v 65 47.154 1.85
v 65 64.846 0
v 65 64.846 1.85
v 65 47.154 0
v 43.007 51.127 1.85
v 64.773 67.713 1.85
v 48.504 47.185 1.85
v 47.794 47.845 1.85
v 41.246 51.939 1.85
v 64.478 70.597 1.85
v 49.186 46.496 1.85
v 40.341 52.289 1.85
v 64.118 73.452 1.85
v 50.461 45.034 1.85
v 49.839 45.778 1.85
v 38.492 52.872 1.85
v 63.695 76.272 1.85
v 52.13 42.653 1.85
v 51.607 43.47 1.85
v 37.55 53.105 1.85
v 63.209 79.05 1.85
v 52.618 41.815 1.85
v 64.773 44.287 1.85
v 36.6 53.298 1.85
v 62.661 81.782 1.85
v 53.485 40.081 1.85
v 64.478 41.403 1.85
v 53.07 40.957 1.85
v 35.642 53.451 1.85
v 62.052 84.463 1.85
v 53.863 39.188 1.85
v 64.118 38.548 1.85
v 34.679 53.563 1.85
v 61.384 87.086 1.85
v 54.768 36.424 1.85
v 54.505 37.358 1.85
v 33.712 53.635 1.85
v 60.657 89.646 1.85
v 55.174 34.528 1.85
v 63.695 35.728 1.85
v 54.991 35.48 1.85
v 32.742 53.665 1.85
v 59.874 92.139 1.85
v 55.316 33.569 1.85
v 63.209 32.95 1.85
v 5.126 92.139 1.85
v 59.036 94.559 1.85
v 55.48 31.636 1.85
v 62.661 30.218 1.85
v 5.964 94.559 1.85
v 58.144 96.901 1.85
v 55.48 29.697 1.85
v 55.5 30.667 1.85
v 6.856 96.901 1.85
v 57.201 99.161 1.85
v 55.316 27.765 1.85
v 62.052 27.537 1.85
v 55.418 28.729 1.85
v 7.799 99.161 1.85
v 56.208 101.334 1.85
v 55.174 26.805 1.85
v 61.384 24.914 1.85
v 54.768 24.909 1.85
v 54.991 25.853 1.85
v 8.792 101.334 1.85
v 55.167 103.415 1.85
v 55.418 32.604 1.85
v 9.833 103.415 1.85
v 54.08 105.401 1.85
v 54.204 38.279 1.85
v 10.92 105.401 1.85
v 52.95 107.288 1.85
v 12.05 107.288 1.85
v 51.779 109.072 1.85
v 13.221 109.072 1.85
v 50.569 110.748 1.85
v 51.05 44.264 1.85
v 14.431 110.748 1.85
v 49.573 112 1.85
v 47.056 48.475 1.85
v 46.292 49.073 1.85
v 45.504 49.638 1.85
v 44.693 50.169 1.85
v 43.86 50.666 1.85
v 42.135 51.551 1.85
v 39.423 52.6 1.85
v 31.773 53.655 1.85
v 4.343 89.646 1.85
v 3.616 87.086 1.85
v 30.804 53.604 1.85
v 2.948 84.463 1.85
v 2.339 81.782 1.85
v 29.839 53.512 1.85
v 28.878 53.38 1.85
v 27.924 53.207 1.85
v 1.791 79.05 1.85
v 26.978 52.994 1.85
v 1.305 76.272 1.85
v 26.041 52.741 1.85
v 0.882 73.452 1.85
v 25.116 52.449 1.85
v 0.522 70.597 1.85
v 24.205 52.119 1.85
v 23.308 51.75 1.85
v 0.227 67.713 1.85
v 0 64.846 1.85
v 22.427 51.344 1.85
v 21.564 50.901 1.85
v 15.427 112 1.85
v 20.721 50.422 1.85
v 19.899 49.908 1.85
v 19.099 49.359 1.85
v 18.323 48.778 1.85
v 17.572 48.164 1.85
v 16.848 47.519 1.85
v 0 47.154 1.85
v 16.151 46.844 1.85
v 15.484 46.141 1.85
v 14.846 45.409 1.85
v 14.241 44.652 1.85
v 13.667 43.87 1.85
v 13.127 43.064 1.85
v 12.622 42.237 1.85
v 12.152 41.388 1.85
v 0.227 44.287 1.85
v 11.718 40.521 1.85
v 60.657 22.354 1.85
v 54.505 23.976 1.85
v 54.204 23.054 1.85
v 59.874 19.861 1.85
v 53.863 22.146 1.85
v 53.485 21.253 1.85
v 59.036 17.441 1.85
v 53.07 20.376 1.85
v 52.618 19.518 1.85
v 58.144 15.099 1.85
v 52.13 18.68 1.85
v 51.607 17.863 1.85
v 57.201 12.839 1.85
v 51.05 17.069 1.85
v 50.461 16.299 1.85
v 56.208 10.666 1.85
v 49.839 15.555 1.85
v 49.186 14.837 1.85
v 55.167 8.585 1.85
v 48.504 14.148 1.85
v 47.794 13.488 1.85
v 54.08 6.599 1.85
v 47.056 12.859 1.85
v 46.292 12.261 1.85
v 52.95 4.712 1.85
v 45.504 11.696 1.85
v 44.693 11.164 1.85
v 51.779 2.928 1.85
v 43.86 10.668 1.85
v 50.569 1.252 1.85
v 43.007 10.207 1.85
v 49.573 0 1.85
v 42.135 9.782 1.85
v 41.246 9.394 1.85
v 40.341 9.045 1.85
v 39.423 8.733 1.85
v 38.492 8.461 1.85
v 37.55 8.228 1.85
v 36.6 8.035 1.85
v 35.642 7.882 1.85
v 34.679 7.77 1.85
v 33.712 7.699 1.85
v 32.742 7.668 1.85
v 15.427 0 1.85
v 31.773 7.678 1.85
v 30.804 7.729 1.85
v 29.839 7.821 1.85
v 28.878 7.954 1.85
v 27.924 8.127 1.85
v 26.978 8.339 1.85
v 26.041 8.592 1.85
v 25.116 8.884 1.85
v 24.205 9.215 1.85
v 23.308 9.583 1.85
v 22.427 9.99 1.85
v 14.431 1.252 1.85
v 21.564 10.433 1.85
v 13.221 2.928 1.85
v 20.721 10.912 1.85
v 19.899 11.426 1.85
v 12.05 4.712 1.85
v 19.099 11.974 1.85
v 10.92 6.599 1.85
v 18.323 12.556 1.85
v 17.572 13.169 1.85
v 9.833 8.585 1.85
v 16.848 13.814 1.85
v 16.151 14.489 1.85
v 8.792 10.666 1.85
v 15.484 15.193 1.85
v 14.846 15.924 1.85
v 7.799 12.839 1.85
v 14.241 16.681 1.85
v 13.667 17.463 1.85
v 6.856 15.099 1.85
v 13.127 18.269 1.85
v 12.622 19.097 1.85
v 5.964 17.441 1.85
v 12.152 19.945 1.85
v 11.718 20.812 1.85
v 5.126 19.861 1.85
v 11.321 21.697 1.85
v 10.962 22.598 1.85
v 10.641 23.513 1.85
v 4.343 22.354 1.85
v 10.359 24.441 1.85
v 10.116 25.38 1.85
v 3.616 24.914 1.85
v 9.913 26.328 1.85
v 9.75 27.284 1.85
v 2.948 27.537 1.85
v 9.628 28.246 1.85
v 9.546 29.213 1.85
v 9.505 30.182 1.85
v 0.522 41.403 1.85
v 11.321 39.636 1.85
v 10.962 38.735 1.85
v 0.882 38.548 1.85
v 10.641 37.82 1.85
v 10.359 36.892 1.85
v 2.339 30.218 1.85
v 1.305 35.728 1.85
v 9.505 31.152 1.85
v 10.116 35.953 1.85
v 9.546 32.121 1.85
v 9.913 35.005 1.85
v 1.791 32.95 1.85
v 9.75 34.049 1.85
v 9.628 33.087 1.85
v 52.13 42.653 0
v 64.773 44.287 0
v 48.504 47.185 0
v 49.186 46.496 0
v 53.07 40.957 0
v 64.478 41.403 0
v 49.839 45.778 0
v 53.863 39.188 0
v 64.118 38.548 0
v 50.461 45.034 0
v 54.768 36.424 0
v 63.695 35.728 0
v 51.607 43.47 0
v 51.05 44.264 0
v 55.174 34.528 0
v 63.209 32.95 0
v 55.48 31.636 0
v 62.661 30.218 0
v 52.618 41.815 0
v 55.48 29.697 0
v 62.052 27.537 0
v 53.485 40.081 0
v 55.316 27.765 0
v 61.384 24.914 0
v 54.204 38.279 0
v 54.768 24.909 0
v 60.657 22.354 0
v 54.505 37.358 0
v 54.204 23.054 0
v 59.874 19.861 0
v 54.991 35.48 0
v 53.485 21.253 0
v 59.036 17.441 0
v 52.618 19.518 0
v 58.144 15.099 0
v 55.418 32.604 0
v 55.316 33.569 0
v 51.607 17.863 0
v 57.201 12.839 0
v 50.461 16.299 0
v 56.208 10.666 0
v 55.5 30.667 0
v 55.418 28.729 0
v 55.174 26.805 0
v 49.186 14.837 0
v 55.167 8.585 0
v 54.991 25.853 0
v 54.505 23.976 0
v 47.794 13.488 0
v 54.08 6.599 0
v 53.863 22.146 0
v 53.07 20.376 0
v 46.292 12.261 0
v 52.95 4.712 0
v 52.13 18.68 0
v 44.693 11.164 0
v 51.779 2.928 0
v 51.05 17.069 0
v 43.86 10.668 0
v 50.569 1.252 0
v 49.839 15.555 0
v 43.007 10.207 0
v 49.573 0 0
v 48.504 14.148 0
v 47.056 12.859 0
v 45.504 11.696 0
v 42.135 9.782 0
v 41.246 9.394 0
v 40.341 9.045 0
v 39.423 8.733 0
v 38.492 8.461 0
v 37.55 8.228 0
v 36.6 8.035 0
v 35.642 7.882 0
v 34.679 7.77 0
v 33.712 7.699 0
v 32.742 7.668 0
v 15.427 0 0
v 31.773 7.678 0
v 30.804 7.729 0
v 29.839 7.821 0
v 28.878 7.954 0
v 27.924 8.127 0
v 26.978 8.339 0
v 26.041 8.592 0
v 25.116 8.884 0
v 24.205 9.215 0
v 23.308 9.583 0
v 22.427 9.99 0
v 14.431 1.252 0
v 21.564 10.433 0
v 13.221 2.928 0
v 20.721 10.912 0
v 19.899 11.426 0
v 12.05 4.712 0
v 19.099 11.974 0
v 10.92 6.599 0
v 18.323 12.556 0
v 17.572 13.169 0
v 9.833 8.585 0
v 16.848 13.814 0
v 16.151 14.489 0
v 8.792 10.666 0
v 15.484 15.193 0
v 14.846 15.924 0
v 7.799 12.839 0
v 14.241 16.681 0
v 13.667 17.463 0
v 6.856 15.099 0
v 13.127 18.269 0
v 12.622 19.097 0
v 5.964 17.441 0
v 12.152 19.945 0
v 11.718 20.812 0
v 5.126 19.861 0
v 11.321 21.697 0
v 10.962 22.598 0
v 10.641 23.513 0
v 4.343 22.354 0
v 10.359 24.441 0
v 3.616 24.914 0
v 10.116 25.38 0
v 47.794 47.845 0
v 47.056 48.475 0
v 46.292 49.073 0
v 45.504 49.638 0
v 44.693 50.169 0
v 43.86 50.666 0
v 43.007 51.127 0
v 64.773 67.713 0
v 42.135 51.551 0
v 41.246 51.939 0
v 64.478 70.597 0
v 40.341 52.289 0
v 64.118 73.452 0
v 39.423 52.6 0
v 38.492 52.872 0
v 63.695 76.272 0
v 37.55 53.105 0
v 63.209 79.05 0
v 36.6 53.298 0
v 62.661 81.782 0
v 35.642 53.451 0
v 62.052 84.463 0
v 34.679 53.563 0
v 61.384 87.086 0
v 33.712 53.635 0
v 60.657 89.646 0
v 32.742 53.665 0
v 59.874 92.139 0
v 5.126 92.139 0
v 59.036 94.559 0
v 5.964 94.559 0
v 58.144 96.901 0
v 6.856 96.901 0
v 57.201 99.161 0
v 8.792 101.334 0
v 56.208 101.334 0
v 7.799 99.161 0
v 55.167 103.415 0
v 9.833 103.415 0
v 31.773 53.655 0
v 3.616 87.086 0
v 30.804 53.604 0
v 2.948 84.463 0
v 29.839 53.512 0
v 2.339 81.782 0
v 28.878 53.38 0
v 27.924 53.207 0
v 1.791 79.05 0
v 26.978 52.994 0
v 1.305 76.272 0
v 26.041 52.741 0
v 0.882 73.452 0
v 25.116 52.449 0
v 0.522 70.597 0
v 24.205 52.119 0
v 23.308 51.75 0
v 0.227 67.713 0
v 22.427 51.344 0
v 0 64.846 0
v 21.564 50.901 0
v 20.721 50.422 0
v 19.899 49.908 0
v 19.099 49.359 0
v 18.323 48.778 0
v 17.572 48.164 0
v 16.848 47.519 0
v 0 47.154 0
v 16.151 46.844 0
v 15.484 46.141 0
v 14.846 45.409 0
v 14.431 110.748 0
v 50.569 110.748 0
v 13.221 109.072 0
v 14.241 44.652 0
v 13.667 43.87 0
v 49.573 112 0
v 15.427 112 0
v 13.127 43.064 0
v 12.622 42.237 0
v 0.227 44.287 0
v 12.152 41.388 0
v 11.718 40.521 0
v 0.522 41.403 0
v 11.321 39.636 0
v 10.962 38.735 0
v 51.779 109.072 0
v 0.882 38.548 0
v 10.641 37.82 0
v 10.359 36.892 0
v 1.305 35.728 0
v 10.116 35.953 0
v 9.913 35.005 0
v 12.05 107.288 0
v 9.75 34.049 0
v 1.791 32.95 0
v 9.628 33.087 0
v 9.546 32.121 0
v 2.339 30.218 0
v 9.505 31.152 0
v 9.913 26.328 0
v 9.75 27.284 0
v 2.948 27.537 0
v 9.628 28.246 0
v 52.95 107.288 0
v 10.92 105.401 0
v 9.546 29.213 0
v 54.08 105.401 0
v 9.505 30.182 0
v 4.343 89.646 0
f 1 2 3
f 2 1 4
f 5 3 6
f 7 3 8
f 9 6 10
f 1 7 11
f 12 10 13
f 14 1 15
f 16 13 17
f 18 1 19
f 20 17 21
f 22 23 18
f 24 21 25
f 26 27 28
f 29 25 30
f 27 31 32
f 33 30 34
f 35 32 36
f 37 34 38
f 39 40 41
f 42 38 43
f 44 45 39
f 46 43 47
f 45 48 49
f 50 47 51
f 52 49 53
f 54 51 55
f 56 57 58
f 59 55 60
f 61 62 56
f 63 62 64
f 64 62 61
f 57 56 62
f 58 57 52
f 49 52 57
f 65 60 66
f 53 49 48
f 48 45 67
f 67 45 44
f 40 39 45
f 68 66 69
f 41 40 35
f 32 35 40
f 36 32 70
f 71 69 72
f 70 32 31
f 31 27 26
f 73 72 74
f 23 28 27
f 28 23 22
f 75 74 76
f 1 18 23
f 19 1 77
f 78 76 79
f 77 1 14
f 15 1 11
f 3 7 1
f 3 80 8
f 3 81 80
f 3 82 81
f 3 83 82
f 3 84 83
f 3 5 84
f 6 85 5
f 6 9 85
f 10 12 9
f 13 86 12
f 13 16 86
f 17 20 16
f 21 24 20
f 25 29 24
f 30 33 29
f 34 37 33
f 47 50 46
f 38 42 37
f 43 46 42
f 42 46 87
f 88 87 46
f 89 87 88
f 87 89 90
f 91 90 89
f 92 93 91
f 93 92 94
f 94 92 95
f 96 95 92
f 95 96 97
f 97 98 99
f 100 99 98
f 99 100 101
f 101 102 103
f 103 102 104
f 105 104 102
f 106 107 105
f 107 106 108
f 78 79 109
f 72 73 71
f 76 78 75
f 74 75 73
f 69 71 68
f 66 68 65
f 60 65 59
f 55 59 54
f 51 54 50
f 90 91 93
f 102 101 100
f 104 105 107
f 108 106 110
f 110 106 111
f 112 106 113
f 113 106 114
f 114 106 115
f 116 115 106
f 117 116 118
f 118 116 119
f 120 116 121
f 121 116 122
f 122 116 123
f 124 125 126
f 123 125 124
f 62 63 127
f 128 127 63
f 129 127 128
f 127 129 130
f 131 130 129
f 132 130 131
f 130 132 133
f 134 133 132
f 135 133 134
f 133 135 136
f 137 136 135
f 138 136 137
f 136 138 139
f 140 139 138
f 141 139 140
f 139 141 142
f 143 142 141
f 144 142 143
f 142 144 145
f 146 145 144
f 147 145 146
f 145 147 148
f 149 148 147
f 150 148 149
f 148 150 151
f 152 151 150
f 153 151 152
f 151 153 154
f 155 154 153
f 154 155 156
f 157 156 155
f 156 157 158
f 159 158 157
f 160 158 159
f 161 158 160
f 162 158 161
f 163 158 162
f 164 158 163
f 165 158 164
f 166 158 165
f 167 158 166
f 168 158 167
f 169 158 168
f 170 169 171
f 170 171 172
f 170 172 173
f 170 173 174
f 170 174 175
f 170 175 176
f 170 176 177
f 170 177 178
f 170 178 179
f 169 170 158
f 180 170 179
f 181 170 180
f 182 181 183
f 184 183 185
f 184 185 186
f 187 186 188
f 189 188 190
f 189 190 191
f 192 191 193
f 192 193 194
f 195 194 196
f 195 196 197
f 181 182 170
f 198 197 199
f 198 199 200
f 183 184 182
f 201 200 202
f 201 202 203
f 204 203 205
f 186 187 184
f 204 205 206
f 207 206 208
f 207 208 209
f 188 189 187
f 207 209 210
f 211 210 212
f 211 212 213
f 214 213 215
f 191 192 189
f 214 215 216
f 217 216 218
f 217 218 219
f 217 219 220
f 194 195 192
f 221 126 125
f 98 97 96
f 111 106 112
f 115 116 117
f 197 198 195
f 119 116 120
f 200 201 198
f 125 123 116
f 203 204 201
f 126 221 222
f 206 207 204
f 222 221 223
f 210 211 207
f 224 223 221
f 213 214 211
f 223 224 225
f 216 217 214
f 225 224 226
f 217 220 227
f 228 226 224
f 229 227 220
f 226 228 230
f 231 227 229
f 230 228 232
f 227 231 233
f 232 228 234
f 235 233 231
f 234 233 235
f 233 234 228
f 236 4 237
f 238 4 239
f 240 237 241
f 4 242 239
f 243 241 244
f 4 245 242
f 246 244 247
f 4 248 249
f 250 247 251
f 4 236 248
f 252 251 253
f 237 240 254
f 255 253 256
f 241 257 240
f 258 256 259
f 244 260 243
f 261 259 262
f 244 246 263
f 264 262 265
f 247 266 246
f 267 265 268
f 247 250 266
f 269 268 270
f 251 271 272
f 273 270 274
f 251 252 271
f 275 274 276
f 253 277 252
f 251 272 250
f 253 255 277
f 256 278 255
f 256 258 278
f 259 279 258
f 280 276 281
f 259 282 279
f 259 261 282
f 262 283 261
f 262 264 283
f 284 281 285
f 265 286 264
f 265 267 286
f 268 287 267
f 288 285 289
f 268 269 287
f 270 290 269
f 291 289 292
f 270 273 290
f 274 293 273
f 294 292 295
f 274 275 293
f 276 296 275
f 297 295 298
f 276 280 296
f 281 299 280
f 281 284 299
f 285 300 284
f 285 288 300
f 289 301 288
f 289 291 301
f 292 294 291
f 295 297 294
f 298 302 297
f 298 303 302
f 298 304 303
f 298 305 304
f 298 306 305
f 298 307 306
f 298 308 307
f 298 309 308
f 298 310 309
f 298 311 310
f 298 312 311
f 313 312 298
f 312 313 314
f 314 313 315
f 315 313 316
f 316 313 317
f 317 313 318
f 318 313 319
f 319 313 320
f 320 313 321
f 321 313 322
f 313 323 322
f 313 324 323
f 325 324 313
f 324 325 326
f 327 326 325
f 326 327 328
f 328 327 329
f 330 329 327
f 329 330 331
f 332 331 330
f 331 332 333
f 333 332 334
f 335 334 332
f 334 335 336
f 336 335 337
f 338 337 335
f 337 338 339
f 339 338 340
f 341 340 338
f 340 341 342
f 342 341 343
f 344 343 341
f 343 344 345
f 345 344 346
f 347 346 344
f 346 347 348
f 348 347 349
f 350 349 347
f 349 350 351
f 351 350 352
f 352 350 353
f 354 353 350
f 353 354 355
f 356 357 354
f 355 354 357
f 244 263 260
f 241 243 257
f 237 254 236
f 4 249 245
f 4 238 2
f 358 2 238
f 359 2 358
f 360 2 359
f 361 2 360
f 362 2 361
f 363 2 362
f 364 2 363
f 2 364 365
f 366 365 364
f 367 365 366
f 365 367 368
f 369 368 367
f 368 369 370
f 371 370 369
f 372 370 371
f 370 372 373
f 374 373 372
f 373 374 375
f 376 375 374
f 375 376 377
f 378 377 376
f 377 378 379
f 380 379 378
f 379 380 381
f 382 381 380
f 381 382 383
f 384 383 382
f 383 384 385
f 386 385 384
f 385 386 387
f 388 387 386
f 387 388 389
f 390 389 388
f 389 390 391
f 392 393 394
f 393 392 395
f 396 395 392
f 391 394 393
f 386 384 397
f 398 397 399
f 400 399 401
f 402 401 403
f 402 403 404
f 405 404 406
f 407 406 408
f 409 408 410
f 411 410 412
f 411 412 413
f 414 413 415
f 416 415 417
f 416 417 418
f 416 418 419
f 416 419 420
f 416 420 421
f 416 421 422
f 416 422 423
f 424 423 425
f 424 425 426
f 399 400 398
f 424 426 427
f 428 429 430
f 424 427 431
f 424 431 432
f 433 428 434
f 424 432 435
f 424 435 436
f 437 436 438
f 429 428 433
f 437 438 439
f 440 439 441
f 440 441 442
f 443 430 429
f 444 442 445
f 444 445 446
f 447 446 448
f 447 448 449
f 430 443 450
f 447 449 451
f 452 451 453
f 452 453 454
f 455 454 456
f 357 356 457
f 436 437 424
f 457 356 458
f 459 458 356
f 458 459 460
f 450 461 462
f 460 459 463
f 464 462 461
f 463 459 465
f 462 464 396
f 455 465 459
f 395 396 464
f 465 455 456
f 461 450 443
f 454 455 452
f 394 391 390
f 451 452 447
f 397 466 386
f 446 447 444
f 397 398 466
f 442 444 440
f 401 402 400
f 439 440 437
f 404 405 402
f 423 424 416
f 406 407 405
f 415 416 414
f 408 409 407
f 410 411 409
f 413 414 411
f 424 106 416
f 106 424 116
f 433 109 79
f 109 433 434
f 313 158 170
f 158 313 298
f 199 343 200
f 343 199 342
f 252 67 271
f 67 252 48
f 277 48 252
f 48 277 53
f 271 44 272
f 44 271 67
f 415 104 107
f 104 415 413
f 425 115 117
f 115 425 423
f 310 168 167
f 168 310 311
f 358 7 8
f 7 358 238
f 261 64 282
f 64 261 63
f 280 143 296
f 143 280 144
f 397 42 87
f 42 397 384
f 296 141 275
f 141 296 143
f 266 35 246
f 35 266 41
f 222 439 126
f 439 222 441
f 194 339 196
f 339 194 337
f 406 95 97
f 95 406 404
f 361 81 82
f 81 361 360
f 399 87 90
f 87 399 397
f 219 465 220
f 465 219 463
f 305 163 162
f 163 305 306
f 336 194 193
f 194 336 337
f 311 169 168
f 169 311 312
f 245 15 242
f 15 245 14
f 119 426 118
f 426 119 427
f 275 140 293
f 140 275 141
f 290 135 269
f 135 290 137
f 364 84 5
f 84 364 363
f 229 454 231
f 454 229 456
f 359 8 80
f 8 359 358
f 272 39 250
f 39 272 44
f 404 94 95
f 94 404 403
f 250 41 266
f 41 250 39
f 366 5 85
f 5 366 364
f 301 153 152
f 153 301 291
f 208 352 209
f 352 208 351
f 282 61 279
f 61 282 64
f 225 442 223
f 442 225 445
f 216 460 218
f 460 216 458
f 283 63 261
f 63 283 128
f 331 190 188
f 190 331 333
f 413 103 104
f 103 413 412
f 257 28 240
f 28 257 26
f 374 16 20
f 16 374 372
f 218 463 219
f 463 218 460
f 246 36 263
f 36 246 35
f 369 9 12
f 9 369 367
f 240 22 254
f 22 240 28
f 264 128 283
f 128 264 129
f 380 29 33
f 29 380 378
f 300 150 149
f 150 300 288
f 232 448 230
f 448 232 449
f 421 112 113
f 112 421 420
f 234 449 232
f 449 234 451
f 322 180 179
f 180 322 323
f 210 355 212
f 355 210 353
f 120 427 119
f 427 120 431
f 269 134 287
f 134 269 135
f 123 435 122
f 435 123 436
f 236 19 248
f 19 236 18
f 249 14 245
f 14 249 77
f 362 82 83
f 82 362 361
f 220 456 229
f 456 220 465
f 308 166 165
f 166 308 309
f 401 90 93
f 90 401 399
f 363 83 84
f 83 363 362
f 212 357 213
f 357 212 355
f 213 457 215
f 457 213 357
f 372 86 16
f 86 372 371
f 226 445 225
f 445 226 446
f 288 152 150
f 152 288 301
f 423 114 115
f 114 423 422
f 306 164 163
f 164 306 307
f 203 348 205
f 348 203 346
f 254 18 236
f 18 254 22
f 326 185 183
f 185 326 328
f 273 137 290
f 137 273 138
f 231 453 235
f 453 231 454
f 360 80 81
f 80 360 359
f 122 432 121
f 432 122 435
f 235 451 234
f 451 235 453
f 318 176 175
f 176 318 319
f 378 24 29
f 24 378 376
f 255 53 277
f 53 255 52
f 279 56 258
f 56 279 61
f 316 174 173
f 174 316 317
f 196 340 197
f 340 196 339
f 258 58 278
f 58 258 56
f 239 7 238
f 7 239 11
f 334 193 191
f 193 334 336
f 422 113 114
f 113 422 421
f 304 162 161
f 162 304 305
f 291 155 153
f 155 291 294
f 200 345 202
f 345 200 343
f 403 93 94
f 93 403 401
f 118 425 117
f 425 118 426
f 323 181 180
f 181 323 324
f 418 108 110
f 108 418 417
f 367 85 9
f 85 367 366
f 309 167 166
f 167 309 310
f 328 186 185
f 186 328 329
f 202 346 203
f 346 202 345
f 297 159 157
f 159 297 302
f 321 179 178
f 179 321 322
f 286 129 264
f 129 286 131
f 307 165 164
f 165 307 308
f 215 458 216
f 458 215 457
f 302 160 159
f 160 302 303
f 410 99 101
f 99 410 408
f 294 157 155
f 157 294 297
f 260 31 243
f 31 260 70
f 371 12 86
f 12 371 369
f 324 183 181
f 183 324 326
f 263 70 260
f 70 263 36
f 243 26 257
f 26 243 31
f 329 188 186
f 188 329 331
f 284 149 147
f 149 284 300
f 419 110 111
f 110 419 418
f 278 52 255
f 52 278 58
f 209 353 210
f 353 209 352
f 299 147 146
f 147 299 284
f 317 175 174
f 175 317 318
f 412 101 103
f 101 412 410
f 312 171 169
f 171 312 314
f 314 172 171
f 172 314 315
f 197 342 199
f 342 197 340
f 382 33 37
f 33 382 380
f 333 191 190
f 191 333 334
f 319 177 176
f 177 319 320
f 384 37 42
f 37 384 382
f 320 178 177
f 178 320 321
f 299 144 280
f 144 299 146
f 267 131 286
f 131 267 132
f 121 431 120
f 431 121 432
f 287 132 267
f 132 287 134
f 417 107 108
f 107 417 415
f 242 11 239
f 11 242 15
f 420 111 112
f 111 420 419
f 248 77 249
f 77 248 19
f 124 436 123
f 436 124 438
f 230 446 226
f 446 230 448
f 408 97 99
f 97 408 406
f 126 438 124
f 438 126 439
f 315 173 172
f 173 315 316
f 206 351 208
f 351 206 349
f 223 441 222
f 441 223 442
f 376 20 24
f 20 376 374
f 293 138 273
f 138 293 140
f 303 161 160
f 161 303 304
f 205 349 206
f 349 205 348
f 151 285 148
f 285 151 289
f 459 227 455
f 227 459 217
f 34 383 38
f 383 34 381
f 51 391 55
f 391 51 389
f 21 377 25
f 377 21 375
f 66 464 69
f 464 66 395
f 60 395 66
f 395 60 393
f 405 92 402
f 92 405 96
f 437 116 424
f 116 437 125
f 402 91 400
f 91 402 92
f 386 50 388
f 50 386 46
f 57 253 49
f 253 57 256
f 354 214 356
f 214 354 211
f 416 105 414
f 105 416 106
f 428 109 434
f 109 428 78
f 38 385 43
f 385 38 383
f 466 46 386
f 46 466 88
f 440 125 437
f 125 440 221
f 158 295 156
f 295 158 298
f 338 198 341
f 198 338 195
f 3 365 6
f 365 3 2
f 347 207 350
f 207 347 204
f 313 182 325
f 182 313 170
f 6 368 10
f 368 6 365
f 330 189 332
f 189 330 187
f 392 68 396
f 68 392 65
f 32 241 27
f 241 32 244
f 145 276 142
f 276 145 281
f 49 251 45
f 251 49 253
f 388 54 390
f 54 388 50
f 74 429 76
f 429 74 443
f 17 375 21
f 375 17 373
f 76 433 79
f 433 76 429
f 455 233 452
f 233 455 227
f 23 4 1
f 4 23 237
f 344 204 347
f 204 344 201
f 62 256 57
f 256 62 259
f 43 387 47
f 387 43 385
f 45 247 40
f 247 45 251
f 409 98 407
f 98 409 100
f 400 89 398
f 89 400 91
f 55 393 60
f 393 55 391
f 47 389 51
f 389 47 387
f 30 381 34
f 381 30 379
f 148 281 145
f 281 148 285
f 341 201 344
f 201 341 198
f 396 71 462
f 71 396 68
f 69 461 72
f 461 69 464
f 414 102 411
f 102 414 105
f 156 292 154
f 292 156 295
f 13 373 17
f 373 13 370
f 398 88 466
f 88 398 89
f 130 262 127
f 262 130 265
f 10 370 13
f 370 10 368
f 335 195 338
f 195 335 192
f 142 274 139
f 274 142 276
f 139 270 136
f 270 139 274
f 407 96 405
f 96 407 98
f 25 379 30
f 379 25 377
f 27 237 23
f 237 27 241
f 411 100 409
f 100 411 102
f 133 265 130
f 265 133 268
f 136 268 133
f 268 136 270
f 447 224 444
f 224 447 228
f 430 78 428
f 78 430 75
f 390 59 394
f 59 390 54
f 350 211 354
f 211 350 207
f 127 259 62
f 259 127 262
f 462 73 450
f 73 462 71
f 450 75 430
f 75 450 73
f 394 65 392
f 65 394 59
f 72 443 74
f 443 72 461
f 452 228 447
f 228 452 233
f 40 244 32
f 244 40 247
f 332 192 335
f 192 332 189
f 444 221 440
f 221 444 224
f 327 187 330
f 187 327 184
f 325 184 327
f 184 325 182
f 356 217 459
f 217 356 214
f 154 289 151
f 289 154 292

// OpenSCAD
PLATE_WIDTH = 112;//mm
PLATE_LENGTH = 65;//mm
PLATE_THICKNESS = 1.85;//mm
BASE_DIAM = 46;//mm

ROUNDING_RADIUS = 41;

facePlate();


module facePlate(){
    //union()
    intersection()
    {
        rotate([0,0,0])
            mainPlate();

            scaleX=.8;
            scaleY=1.6;
            translate([(PLATE_LENGTH/2), (PLATE_WIDTH/2), -1])
                scale([scaleX, scaleY, 1])
                    rotate([0,0,0])
                        cylinder(r=ROUNDING_RADIUS, h=5, $fn=140);
          
        }
 
}

module mainPlate(){
  difference(){
        cube([PLATE_LENGTH,PLATE_WIDTH, PLATE_THICKNESS]);

        translate([(PLATE_LENGTH/2), BASE_DIAM/1.5, -.5]) {
            cylinder(r=BASE_DIAM/2, h=5, $fn=149);
        }
    }

}
